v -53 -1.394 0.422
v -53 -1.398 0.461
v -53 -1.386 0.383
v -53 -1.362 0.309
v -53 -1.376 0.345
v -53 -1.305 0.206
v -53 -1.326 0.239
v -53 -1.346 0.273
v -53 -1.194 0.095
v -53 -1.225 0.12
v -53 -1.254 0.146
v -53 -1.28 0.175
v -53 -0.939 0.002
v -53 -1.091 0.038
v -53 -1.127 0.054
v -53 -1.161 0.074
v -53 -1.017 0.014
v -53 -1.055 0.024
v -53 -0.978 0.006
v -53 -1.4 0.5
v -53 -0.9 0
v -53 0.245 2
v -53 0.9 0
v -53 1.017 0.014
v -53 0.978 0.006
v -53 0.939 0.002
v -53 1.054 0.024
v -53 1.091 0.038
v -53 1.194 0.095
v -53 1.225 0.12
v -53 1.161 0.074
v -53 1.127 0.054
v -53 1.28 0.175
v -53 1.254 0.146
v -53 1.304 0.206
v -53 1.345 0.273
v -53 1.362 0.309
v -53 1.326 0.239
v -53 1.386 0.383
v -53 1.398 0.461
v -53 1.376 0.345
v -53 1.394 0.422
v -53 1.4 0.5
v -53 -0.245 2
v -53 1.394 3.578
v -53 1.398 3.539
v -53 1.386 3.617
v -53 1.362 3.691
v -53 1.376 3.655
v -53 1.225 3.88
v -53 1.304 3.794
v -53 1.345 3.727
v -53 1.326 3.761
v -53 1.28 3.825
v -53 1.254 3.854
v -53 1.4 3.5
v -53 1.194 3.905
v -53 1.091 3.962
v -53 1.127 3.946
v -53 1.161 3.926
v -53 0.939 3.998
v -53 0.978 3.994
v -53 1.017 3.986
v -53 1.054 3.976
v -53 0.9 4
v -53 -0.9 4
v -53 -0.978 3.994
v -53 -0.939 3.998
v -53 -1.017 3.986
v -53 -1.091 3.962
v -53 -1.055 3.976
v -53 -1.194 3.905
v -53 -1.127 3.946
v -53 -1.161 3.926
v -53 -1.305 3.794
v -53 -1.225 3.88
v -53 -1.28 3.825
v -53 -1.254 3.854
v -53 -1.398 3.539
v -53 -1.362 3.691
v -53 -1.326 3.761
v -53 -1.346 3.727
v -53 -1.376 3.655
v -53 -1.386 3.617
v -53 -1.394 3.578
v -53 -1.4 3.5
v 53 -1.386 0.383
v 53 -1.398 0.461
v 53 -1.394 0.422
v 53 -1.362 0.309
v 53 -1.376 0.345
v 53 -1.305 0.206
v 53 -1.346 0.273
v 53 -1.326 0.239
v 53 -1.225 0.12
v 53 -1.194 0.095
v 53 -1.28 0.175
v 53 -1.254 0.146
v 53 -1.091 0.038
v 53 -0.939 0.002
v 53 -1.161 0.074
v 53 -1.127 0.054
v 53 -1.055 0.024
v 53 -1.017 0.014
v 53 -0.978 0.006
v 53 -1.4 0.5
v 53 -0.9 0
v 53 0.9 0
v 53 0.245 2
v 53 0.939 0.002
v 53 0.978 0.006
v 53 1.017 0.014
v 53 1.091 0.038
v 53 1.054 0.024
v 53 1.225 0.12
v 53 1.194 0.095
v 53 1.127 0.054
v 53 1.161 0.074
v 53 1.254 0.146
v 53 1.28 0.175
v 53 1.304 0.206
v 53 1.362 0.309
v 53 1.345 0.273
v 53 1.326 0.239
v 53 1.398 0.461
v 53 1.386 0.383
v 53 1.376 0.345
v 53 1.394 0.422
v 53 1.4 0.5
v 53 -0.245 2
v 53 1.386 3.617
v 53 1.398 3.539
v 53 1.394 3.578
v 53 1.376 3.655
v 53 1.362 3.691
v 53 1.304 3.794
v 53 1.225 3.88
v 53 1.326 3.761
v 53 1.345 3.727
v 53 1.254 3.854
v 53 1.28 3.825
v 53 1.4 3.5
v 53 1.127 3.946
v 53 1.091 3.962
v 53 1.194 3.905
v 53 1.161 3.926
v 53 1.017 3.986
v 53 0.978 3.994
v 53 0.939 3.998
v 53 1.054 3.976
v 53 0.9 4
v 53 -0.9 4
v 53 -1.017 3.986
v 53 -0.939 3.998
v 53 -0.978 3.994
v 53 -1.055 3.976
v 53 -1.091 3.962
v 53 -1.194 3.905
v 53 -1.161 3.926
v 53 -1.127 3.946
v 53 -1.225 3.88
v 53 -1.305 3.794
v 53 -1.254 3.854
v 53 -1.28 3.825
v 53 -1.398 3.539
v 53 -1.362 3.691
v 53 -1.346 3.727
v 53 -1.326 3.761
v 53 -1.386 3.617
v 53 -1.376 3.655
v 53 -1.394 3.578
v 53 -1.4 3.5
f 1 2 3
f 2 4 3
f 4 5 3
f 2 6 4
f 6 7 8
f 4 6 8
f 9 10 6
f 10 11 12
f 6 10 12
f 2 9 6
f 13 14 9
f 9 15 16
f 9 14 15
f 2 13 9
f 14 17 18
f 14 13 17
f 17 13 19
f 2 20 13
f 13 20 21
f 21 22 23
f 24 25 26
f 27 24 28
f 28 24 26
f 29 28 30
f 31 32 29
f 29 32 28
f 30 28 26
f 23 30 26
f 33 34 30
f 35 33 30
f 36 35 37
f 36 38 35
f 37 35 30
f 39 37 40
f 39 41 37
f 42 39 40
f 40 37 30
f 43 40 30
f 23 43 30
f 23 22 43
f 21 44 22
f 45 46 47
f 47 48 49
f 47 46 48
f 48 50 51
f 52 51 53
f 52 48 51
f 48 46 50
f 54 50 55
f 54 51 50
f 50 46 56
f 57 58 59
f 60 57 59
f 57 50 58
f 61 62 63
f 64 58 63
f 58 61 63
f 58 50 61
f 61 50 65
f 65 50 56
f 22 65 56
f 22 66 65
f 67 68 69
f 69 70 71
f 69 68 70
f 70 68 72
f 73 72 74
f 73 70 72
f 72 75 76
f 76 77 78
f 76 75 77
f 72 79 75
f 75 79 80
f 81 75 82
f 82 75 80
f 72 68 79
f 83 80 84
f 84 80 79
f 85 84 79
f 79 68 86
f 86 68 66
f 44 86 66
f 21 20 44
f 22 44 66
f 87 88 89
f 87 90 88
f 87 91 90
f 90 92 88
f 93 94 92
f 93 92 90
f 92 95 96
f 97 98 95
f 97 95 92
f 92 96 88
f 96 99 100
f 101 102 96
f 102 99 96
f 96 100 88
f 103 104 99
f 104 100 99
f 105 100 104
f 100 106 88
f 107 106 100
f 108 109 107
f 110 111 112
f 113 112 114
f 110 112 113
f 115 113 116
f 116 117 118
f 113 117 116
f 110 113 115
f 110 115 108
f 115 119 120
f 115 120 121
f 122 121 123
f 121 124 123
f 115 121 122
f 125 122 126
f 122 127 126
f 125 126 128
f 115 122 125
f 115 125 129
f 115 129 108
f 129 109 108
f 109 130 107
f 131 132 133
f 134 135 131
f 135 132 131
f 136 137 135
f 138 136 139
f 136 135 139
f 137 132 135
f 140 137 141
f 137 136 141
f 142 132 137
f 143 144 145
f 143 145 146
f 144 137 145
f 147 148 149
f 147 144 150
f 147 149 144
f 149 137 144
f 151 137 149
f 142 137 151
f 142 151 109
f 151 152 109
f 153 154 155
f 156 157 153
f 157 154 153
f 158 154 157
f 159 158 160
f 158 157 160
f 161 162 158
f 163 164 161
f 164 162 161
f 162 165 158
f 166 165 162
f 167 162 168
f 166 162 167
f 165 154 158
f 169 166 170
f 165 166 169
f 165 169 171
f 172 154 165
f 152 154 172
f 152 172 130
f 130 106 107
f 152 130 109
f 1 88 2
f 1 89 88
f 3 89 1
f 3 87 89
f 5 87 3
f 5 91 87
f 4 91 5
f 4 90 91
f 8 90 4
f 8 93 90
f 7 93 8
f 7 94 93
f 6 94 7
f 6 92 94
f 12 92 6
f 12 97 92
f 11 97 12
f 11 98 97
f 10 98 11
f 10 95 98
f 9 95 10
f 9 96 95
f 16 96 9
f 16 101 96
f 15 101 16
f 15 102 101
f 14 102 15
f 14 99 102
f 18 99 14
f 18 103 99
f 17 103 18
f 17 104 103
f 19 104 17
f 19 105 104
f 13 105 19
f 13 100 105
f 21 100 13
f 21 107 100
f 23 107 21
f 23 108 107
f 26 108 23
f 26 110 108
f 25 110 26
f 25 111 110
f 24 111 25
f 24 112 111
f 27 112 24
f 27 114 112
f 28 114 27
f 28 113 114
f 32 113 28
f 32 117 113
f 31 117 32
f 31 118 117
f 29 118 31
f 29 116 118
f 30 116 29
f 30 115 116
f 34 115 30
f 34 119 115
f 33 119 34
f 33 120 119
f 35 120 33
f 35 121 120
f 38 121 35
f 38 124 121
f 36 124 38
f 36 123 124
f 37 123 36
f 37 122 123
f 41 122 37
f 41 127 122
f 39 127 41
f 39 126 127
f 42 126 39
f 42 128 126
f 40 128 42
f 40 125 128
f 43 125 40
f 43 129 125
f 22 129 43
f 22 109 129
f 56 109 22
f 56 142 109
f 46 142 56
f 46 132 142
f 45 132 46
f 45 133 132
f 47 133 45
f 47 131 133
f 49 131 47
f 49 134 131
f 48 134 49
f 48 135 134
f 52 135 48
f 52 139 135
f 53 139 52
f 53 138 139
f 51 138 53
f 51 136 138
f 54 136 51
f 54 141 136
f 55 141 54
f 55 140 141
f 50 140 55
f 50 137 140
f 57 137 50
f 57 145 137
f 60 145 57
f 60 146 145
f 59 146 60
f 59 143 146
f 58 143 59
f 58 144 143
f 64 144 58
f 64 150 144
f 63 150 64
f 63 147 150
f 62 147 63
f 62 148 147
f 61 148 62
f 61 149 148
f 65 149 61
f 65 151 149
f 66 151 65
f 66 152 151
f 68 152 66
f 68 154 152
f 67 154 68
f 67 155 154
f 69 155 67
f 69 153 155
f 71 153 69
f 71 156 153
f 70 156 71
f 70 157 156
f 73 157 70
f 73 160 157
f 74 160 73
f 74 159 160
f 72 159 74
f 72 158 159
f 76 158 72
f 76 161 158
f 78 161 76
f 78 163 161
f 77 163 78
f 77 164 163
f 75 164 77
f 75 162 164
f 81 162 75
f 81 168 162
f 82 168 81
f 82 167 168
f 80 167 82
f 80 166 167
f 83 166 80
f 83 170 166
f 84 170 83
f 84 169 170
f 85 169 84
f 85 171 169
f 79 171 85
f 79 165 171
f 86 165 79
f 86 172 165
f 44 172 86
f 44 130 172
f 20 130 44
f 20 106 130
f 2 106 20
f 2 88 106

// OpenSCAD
include <../steering_parameters.scad>

use <../../lib/slider.scad>

module steering_rack_anti_tilt_key() {
  translate([-steering_panel_rail_len / 2,
             steering_rack_width / 2
             - steering_rack_anti_tilt_key_thickness
             - steering_rack_anti_tilt_rack_x_offset,
             0]) {
    cube([steering_panel_rail_len,
          steering_rack_anti_tilt_key_thickness,
          steering_rack_anti_tilt_key_height], center=false);
  }
}

module steering_rail(h=steering_panel_rail_height,
                     w=steering_panel_rail_thickness,
                     l=steering_panel_rail_len,
                     angle=steering_panel_rail_angle,
                     r=steering_panel_rail_rad) {
  translate([0, -w / 2, 0]) {
    rotate([90, 0, 90]) {
      linear_extrude(height=l,
                     center=true) {
        dovetail_rib(w=w,
                     h=h,
                     angle=angle,
                     r=r,
                     center=false);
      }
    }
  }
}

module steering_rail_relief_cutter(h=steering_panel_rail_height,
                                   w=steering_panel_rail_thickness
                                   + steering_rack_rail_tolerance,
                                   l=steering_panel_rail_len,
                                   angle=steering_panel_rail_angle,
                                   r=steering_panel_rail_rad,
                                   edge_land=steering_rail_edge_land,
                                   relief_depth=steering_rail_relief_depth) {
  d_parallel = relief_depth / cos(angle);
  translate([0, 0, h / 2]) {
    rotate([90, 0, 90]) {
      linear_extrude(height=l,
                     center=true,
                     convexity=2) {
        intersection() {
          offset(r=d_parallel) {
            dovetail_rib(w=w, h=h, angle=angle, r=r, center=true);
          }

          offset(r=-edge_land) {
            offset(r = edge_land) {
              dovetail_rib(w=w, h=h, angle=angle, r=r, center=true);
            }
          }
        }
      }
    }
  }
}

union() {
  // translate([0, 0, 0]) {
  //   color("green", alpha=1) {
  //     steering_rail();
  //   }
  // }
  steering_rail();
  // color("red", alpha=1) {
  //   steering_rail_relief_cutter();
  // }
}
// steering_rail();
